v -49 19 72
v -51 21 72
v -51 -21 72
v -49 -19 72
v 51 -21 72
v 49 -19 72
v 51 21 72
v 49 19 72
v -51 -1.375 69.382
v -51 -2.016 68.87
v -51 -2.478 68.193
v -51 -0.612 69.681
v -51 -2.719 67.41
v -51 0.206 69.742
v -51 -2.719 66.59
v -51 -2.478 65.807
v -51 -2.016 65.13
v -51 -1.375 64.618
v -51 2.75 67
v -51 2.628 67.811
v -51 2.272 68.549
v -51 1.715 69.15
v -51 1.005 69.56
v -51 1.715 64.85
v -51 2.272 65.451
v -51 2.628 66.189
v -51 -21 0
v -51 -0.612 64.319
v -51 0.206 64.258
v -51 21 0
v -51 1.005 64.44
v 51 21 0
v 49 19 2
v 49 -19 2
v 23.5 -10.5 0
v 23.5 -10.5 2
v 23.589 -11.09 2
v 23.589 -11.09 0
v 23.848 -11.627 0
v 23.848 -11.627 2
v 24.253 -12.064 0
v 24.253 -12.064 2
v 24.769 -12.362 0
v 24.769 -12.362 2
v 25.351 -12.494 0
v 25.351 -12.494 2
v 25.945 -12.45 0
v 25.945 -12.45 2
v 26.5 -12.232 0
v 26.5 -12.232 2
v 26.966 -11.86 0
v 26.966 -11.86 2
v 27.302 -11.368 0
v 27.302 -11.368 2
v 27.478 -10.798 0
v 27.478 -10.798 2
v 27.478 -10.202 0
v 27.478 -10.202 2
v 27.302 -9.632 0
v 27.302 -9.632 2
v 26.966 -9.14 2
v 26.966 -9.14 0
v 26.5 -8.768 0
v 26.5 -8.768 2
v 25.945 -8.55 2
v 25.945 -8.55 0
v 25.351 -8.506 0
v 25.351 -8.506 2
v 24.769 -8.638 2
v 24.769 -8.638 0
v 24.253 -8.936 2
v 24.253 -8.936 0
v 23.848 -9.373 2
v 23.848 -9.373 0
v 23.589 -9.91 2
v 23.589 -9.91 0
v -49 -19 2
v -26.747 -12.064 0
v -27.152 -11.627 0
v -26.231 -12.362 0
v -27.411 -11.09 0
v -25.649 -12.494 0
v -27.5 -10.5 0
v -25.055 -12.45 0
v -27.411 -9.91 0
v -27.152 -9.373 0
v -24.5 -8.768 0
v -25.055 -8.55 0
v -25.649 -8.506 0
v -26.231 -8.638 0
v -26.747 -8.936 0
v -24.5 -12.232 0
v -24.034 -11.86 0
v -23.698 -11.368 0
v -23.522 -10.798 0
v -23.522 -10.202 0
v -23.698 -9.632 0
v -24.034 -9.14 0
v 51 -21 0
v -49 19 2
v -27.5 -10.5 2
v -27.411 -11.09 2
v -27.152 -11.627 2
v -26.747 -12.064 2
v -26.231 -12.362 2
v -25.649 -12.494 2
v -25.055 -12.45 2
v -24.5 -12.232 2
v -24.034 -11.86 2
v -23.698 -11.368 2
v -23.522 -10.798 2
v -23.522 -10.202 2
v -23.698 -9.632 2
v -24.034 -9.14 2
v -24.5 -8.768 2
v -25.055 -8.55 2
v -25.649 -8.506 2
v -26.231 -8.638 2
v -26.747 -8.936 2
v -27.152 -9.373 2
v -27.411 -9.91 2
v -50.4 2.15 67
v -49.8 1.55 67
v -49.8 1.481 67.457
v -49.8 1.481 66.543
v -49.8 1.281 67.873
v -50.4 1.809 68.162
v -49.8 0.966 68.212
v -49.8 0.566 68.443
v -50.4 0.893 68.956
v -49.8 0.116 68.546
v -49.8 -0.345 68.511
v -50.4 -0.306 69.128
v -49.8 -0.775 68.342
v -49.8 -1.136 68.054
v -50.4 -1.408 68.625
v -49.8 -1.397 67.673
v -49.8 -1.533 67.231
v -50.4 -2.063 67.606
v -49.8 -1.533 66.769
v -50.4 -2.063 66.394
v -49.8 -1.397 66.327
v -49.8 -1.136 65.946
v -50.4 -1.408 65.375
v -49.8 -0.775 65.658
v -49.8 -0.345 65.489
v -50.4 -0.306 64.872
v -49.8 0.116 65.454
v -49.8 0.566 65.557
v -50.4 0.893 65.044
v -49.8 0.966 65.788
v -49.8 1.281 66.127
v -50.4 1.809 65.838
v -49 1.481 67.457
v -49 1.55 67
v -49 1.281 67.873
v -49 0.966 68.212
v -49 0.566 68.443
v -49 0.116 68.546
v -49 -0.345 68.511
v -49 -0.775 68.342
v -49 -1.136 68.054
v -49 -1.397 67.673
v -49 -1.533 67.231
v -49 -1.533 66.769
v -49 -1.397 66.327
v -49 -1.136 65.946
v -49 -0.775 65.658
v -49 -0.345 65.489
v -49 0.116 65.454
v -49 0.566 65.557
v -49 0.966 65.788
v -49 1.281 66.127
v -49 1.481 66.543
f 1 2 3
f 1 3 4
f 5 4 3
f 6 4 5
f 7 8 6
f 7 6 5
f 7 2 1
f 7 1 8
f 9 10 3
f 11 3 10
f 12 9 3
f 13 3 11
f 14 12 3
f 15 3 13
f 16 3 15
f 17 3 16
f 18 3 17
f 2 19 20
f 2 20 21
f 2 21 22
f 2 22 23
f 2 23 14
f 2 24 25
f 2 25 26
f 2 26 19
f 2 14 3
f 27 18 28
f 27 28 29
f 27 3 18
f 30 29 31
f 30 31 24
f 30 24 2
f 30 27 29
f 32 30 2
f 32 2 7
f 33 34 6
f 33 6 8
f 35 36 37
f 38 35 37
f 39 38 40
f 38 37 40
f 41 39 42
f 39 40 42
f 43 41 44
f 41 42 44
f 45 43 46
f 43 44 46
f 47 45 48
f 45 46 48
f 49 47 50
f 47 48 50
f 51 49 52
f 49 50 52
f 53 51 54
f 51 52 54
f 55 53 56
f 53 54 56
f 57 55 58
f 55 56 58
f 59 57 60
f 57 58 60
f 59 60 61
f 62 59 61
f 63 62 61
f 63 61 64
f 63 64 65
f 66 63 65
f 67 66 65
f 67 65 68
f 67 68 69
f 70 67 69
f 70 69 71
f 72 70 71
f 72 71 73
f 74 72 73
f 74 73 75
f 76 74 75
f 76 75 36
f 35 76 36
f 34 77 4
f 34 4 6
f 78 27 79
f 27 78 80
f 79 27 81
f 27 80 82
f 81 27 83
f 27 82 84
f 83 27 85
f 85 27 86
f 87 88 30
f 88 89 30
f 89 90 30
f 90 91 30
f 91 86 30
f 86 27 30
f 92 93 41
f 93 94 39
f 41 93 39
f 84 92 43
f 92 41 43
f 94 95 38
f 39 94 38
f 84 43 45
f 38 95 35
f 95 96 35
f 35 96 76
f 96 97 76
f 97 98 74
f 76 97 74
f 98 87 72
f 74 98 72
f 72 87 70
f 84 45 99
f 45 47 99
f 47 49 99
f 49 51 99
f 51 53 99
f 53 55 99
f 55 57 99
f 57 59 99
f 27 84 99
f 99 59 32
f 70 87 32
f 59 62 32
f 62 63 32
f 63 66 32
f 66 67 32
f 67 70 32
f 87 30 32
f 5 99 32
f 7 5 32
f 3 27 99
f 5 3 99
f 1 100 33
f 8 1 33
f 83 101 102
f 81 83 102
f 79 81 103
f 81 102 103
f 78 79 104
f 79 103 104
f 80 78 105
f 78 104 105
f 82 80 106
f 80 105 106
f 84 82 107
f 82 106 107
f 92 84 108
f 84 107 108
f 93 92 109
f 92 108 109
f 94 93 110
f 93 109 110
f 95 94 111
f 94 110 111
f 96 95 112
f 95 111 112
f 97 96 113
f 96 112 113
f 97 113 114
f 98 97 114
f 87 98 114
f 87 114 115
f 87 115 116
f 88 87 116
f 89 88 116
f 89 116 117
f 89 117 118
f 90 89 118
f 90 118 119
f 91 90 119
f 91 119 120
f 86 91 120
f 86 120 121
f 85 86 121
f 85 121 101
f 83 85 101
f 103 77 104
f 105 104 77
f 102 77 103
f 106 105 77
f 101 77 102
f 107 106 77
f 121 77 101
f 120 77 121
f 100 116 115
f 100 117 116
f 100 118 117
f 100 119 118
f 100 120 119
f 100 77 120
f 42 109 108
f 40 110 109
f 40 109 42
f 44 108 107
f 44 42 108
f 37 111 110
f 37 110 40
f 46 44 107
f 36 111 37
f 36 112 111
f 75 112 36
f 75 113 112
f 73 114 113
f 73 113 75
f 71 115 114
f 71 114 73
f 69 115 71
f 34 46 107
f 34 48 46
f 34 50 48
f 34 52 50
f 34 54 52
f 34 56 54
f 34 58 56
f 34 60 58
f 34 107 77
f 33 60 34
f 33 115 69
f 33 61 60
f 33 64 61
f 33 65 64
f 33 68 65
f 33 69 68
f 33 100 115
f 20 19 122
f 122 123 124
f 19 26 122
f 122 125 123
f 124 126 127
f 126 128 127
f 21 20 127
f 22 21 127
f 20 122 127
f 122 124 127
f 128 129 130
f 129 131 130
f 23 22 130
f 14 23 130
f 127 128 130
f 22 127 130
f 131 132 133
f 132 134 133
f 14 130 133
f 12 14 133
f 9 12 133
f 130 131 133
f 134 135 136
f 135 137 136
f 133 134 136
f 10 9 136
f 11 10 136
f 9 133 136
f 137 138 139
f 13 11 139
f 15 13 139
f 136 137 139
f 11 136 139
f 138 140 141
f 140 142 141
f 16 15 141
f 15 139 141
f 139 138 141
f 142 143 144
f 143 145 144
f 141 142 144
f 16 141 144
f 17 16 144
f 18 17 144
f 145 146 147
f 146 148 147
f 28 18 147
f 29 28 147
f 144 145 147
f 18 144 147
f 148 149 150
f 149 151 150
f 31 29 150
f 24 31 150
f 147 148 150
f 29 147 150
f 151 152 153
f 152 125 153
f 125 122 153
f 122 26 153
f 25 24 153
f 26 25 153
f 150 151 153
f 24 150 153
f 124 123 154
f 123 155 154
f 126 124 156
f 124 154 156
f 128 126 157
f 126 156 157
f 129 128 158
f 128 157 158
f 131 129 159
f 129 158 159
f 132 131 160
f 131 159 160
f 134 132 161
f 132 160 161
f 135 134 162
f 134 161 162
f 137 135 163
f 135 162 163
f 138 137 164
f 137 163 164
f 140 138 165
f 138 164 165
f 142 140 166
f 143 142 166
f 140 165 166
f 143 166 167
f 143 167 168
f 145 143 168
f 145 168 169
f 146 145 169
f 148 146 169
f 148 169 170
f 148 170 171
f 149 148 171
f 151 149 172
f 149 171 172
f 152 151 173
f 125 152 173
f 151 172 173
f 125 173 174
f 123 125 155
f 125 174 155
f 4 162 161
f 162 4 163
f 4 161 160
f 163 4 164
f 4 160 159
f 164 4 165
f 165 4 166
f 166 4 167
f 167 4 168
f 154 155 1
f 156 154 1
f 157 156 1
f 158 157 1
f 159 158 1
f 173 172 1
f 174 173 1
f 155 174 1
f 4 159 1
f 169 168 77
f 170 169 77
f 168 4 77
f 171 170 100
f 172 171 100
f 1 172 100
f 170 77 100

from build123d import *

# Parameters (mm, degrees)
F1_W           = 102
F1_H           = 42
F1_W_2         = 98
F1_H_2         = 38
F2_DEPTH       = 72
F3_R           = 8.1966630734
F4_DEPTH       = 25
F6_D           = 3.1
F6_DEPTH       = 20
F6_CSINK_D     = 5.5
F6_CSINK_ANGLE = 90
F6_TIP         = 0.9313339595
F7_W           = 102
F7_H           = 42
F8_DEPTH       = 2
F10_D          = 4
F10_DEPTH      = 20
F10_TIP        = 1.2017212381


with BuildPart() as f2:
    # F1 (on Top) → F2 (new body)
    with BuildSketch(Plane.XY):
        Rectangle(F1_W, F1_H)
        Rectangle(F1_W_2, F1_H_2, mode=Mode.SUBTRACT)
    extrude(amount=F2_DEPTH)

    # F3 (on face) → F4 (cut)
    with BuildSketch(Plane(origin=(0, 0, 0), x_dir=(1, 0, 0), z_dir=(0, 0, -1))):
        Circle(F3_R)
    extrude(amount=-F4_DEPTH, mode=Mode.SUBTRACT)

    # F6
    with Locations(Plane(origin=(-51, 0, 0), x_dir=(0, -1, 0), z_dir=(-1, 0, 0))):
        with Locations((0, 67)):
            CounterSinkHole(F6_D / 2, F6_CSINK_D / 2, depth=F6_DEPTH, counter_sink_angle=F6_CSINK_ANGLE)
            with Locations((0, 0, -(F6_DEPTH + F6_TIP / 2))):  # 118° drill point
                Cone(0, F6_D / 2, F6_TIP, mode=Mode.SUBTRACT)

    # F7 (on Top) → F8 (join)
    with BuildSketch(Plane.XY):
        Rectangle(F7_W, F7_H)
    extrude(amount=F8_DEPTH)

    # F10
    with Locations(Plane(origin=(0, 0, 0), x_dir=(1, 0, 0), z_dir=(0, 0, -1))):
        with Locations((25.5, 10.5), (-25.5, 10.5)):
            Hole(F10_D / 2, depth=F10_DEPTH)
            with Locations((0, 0, -(F10_DEPTH + F10_TIP / 2))):  # 118° drill point
                Cone(0, F10_D / 2, F10_TIP, mode=Mode.SUBTRACT)


solid = f2.part
